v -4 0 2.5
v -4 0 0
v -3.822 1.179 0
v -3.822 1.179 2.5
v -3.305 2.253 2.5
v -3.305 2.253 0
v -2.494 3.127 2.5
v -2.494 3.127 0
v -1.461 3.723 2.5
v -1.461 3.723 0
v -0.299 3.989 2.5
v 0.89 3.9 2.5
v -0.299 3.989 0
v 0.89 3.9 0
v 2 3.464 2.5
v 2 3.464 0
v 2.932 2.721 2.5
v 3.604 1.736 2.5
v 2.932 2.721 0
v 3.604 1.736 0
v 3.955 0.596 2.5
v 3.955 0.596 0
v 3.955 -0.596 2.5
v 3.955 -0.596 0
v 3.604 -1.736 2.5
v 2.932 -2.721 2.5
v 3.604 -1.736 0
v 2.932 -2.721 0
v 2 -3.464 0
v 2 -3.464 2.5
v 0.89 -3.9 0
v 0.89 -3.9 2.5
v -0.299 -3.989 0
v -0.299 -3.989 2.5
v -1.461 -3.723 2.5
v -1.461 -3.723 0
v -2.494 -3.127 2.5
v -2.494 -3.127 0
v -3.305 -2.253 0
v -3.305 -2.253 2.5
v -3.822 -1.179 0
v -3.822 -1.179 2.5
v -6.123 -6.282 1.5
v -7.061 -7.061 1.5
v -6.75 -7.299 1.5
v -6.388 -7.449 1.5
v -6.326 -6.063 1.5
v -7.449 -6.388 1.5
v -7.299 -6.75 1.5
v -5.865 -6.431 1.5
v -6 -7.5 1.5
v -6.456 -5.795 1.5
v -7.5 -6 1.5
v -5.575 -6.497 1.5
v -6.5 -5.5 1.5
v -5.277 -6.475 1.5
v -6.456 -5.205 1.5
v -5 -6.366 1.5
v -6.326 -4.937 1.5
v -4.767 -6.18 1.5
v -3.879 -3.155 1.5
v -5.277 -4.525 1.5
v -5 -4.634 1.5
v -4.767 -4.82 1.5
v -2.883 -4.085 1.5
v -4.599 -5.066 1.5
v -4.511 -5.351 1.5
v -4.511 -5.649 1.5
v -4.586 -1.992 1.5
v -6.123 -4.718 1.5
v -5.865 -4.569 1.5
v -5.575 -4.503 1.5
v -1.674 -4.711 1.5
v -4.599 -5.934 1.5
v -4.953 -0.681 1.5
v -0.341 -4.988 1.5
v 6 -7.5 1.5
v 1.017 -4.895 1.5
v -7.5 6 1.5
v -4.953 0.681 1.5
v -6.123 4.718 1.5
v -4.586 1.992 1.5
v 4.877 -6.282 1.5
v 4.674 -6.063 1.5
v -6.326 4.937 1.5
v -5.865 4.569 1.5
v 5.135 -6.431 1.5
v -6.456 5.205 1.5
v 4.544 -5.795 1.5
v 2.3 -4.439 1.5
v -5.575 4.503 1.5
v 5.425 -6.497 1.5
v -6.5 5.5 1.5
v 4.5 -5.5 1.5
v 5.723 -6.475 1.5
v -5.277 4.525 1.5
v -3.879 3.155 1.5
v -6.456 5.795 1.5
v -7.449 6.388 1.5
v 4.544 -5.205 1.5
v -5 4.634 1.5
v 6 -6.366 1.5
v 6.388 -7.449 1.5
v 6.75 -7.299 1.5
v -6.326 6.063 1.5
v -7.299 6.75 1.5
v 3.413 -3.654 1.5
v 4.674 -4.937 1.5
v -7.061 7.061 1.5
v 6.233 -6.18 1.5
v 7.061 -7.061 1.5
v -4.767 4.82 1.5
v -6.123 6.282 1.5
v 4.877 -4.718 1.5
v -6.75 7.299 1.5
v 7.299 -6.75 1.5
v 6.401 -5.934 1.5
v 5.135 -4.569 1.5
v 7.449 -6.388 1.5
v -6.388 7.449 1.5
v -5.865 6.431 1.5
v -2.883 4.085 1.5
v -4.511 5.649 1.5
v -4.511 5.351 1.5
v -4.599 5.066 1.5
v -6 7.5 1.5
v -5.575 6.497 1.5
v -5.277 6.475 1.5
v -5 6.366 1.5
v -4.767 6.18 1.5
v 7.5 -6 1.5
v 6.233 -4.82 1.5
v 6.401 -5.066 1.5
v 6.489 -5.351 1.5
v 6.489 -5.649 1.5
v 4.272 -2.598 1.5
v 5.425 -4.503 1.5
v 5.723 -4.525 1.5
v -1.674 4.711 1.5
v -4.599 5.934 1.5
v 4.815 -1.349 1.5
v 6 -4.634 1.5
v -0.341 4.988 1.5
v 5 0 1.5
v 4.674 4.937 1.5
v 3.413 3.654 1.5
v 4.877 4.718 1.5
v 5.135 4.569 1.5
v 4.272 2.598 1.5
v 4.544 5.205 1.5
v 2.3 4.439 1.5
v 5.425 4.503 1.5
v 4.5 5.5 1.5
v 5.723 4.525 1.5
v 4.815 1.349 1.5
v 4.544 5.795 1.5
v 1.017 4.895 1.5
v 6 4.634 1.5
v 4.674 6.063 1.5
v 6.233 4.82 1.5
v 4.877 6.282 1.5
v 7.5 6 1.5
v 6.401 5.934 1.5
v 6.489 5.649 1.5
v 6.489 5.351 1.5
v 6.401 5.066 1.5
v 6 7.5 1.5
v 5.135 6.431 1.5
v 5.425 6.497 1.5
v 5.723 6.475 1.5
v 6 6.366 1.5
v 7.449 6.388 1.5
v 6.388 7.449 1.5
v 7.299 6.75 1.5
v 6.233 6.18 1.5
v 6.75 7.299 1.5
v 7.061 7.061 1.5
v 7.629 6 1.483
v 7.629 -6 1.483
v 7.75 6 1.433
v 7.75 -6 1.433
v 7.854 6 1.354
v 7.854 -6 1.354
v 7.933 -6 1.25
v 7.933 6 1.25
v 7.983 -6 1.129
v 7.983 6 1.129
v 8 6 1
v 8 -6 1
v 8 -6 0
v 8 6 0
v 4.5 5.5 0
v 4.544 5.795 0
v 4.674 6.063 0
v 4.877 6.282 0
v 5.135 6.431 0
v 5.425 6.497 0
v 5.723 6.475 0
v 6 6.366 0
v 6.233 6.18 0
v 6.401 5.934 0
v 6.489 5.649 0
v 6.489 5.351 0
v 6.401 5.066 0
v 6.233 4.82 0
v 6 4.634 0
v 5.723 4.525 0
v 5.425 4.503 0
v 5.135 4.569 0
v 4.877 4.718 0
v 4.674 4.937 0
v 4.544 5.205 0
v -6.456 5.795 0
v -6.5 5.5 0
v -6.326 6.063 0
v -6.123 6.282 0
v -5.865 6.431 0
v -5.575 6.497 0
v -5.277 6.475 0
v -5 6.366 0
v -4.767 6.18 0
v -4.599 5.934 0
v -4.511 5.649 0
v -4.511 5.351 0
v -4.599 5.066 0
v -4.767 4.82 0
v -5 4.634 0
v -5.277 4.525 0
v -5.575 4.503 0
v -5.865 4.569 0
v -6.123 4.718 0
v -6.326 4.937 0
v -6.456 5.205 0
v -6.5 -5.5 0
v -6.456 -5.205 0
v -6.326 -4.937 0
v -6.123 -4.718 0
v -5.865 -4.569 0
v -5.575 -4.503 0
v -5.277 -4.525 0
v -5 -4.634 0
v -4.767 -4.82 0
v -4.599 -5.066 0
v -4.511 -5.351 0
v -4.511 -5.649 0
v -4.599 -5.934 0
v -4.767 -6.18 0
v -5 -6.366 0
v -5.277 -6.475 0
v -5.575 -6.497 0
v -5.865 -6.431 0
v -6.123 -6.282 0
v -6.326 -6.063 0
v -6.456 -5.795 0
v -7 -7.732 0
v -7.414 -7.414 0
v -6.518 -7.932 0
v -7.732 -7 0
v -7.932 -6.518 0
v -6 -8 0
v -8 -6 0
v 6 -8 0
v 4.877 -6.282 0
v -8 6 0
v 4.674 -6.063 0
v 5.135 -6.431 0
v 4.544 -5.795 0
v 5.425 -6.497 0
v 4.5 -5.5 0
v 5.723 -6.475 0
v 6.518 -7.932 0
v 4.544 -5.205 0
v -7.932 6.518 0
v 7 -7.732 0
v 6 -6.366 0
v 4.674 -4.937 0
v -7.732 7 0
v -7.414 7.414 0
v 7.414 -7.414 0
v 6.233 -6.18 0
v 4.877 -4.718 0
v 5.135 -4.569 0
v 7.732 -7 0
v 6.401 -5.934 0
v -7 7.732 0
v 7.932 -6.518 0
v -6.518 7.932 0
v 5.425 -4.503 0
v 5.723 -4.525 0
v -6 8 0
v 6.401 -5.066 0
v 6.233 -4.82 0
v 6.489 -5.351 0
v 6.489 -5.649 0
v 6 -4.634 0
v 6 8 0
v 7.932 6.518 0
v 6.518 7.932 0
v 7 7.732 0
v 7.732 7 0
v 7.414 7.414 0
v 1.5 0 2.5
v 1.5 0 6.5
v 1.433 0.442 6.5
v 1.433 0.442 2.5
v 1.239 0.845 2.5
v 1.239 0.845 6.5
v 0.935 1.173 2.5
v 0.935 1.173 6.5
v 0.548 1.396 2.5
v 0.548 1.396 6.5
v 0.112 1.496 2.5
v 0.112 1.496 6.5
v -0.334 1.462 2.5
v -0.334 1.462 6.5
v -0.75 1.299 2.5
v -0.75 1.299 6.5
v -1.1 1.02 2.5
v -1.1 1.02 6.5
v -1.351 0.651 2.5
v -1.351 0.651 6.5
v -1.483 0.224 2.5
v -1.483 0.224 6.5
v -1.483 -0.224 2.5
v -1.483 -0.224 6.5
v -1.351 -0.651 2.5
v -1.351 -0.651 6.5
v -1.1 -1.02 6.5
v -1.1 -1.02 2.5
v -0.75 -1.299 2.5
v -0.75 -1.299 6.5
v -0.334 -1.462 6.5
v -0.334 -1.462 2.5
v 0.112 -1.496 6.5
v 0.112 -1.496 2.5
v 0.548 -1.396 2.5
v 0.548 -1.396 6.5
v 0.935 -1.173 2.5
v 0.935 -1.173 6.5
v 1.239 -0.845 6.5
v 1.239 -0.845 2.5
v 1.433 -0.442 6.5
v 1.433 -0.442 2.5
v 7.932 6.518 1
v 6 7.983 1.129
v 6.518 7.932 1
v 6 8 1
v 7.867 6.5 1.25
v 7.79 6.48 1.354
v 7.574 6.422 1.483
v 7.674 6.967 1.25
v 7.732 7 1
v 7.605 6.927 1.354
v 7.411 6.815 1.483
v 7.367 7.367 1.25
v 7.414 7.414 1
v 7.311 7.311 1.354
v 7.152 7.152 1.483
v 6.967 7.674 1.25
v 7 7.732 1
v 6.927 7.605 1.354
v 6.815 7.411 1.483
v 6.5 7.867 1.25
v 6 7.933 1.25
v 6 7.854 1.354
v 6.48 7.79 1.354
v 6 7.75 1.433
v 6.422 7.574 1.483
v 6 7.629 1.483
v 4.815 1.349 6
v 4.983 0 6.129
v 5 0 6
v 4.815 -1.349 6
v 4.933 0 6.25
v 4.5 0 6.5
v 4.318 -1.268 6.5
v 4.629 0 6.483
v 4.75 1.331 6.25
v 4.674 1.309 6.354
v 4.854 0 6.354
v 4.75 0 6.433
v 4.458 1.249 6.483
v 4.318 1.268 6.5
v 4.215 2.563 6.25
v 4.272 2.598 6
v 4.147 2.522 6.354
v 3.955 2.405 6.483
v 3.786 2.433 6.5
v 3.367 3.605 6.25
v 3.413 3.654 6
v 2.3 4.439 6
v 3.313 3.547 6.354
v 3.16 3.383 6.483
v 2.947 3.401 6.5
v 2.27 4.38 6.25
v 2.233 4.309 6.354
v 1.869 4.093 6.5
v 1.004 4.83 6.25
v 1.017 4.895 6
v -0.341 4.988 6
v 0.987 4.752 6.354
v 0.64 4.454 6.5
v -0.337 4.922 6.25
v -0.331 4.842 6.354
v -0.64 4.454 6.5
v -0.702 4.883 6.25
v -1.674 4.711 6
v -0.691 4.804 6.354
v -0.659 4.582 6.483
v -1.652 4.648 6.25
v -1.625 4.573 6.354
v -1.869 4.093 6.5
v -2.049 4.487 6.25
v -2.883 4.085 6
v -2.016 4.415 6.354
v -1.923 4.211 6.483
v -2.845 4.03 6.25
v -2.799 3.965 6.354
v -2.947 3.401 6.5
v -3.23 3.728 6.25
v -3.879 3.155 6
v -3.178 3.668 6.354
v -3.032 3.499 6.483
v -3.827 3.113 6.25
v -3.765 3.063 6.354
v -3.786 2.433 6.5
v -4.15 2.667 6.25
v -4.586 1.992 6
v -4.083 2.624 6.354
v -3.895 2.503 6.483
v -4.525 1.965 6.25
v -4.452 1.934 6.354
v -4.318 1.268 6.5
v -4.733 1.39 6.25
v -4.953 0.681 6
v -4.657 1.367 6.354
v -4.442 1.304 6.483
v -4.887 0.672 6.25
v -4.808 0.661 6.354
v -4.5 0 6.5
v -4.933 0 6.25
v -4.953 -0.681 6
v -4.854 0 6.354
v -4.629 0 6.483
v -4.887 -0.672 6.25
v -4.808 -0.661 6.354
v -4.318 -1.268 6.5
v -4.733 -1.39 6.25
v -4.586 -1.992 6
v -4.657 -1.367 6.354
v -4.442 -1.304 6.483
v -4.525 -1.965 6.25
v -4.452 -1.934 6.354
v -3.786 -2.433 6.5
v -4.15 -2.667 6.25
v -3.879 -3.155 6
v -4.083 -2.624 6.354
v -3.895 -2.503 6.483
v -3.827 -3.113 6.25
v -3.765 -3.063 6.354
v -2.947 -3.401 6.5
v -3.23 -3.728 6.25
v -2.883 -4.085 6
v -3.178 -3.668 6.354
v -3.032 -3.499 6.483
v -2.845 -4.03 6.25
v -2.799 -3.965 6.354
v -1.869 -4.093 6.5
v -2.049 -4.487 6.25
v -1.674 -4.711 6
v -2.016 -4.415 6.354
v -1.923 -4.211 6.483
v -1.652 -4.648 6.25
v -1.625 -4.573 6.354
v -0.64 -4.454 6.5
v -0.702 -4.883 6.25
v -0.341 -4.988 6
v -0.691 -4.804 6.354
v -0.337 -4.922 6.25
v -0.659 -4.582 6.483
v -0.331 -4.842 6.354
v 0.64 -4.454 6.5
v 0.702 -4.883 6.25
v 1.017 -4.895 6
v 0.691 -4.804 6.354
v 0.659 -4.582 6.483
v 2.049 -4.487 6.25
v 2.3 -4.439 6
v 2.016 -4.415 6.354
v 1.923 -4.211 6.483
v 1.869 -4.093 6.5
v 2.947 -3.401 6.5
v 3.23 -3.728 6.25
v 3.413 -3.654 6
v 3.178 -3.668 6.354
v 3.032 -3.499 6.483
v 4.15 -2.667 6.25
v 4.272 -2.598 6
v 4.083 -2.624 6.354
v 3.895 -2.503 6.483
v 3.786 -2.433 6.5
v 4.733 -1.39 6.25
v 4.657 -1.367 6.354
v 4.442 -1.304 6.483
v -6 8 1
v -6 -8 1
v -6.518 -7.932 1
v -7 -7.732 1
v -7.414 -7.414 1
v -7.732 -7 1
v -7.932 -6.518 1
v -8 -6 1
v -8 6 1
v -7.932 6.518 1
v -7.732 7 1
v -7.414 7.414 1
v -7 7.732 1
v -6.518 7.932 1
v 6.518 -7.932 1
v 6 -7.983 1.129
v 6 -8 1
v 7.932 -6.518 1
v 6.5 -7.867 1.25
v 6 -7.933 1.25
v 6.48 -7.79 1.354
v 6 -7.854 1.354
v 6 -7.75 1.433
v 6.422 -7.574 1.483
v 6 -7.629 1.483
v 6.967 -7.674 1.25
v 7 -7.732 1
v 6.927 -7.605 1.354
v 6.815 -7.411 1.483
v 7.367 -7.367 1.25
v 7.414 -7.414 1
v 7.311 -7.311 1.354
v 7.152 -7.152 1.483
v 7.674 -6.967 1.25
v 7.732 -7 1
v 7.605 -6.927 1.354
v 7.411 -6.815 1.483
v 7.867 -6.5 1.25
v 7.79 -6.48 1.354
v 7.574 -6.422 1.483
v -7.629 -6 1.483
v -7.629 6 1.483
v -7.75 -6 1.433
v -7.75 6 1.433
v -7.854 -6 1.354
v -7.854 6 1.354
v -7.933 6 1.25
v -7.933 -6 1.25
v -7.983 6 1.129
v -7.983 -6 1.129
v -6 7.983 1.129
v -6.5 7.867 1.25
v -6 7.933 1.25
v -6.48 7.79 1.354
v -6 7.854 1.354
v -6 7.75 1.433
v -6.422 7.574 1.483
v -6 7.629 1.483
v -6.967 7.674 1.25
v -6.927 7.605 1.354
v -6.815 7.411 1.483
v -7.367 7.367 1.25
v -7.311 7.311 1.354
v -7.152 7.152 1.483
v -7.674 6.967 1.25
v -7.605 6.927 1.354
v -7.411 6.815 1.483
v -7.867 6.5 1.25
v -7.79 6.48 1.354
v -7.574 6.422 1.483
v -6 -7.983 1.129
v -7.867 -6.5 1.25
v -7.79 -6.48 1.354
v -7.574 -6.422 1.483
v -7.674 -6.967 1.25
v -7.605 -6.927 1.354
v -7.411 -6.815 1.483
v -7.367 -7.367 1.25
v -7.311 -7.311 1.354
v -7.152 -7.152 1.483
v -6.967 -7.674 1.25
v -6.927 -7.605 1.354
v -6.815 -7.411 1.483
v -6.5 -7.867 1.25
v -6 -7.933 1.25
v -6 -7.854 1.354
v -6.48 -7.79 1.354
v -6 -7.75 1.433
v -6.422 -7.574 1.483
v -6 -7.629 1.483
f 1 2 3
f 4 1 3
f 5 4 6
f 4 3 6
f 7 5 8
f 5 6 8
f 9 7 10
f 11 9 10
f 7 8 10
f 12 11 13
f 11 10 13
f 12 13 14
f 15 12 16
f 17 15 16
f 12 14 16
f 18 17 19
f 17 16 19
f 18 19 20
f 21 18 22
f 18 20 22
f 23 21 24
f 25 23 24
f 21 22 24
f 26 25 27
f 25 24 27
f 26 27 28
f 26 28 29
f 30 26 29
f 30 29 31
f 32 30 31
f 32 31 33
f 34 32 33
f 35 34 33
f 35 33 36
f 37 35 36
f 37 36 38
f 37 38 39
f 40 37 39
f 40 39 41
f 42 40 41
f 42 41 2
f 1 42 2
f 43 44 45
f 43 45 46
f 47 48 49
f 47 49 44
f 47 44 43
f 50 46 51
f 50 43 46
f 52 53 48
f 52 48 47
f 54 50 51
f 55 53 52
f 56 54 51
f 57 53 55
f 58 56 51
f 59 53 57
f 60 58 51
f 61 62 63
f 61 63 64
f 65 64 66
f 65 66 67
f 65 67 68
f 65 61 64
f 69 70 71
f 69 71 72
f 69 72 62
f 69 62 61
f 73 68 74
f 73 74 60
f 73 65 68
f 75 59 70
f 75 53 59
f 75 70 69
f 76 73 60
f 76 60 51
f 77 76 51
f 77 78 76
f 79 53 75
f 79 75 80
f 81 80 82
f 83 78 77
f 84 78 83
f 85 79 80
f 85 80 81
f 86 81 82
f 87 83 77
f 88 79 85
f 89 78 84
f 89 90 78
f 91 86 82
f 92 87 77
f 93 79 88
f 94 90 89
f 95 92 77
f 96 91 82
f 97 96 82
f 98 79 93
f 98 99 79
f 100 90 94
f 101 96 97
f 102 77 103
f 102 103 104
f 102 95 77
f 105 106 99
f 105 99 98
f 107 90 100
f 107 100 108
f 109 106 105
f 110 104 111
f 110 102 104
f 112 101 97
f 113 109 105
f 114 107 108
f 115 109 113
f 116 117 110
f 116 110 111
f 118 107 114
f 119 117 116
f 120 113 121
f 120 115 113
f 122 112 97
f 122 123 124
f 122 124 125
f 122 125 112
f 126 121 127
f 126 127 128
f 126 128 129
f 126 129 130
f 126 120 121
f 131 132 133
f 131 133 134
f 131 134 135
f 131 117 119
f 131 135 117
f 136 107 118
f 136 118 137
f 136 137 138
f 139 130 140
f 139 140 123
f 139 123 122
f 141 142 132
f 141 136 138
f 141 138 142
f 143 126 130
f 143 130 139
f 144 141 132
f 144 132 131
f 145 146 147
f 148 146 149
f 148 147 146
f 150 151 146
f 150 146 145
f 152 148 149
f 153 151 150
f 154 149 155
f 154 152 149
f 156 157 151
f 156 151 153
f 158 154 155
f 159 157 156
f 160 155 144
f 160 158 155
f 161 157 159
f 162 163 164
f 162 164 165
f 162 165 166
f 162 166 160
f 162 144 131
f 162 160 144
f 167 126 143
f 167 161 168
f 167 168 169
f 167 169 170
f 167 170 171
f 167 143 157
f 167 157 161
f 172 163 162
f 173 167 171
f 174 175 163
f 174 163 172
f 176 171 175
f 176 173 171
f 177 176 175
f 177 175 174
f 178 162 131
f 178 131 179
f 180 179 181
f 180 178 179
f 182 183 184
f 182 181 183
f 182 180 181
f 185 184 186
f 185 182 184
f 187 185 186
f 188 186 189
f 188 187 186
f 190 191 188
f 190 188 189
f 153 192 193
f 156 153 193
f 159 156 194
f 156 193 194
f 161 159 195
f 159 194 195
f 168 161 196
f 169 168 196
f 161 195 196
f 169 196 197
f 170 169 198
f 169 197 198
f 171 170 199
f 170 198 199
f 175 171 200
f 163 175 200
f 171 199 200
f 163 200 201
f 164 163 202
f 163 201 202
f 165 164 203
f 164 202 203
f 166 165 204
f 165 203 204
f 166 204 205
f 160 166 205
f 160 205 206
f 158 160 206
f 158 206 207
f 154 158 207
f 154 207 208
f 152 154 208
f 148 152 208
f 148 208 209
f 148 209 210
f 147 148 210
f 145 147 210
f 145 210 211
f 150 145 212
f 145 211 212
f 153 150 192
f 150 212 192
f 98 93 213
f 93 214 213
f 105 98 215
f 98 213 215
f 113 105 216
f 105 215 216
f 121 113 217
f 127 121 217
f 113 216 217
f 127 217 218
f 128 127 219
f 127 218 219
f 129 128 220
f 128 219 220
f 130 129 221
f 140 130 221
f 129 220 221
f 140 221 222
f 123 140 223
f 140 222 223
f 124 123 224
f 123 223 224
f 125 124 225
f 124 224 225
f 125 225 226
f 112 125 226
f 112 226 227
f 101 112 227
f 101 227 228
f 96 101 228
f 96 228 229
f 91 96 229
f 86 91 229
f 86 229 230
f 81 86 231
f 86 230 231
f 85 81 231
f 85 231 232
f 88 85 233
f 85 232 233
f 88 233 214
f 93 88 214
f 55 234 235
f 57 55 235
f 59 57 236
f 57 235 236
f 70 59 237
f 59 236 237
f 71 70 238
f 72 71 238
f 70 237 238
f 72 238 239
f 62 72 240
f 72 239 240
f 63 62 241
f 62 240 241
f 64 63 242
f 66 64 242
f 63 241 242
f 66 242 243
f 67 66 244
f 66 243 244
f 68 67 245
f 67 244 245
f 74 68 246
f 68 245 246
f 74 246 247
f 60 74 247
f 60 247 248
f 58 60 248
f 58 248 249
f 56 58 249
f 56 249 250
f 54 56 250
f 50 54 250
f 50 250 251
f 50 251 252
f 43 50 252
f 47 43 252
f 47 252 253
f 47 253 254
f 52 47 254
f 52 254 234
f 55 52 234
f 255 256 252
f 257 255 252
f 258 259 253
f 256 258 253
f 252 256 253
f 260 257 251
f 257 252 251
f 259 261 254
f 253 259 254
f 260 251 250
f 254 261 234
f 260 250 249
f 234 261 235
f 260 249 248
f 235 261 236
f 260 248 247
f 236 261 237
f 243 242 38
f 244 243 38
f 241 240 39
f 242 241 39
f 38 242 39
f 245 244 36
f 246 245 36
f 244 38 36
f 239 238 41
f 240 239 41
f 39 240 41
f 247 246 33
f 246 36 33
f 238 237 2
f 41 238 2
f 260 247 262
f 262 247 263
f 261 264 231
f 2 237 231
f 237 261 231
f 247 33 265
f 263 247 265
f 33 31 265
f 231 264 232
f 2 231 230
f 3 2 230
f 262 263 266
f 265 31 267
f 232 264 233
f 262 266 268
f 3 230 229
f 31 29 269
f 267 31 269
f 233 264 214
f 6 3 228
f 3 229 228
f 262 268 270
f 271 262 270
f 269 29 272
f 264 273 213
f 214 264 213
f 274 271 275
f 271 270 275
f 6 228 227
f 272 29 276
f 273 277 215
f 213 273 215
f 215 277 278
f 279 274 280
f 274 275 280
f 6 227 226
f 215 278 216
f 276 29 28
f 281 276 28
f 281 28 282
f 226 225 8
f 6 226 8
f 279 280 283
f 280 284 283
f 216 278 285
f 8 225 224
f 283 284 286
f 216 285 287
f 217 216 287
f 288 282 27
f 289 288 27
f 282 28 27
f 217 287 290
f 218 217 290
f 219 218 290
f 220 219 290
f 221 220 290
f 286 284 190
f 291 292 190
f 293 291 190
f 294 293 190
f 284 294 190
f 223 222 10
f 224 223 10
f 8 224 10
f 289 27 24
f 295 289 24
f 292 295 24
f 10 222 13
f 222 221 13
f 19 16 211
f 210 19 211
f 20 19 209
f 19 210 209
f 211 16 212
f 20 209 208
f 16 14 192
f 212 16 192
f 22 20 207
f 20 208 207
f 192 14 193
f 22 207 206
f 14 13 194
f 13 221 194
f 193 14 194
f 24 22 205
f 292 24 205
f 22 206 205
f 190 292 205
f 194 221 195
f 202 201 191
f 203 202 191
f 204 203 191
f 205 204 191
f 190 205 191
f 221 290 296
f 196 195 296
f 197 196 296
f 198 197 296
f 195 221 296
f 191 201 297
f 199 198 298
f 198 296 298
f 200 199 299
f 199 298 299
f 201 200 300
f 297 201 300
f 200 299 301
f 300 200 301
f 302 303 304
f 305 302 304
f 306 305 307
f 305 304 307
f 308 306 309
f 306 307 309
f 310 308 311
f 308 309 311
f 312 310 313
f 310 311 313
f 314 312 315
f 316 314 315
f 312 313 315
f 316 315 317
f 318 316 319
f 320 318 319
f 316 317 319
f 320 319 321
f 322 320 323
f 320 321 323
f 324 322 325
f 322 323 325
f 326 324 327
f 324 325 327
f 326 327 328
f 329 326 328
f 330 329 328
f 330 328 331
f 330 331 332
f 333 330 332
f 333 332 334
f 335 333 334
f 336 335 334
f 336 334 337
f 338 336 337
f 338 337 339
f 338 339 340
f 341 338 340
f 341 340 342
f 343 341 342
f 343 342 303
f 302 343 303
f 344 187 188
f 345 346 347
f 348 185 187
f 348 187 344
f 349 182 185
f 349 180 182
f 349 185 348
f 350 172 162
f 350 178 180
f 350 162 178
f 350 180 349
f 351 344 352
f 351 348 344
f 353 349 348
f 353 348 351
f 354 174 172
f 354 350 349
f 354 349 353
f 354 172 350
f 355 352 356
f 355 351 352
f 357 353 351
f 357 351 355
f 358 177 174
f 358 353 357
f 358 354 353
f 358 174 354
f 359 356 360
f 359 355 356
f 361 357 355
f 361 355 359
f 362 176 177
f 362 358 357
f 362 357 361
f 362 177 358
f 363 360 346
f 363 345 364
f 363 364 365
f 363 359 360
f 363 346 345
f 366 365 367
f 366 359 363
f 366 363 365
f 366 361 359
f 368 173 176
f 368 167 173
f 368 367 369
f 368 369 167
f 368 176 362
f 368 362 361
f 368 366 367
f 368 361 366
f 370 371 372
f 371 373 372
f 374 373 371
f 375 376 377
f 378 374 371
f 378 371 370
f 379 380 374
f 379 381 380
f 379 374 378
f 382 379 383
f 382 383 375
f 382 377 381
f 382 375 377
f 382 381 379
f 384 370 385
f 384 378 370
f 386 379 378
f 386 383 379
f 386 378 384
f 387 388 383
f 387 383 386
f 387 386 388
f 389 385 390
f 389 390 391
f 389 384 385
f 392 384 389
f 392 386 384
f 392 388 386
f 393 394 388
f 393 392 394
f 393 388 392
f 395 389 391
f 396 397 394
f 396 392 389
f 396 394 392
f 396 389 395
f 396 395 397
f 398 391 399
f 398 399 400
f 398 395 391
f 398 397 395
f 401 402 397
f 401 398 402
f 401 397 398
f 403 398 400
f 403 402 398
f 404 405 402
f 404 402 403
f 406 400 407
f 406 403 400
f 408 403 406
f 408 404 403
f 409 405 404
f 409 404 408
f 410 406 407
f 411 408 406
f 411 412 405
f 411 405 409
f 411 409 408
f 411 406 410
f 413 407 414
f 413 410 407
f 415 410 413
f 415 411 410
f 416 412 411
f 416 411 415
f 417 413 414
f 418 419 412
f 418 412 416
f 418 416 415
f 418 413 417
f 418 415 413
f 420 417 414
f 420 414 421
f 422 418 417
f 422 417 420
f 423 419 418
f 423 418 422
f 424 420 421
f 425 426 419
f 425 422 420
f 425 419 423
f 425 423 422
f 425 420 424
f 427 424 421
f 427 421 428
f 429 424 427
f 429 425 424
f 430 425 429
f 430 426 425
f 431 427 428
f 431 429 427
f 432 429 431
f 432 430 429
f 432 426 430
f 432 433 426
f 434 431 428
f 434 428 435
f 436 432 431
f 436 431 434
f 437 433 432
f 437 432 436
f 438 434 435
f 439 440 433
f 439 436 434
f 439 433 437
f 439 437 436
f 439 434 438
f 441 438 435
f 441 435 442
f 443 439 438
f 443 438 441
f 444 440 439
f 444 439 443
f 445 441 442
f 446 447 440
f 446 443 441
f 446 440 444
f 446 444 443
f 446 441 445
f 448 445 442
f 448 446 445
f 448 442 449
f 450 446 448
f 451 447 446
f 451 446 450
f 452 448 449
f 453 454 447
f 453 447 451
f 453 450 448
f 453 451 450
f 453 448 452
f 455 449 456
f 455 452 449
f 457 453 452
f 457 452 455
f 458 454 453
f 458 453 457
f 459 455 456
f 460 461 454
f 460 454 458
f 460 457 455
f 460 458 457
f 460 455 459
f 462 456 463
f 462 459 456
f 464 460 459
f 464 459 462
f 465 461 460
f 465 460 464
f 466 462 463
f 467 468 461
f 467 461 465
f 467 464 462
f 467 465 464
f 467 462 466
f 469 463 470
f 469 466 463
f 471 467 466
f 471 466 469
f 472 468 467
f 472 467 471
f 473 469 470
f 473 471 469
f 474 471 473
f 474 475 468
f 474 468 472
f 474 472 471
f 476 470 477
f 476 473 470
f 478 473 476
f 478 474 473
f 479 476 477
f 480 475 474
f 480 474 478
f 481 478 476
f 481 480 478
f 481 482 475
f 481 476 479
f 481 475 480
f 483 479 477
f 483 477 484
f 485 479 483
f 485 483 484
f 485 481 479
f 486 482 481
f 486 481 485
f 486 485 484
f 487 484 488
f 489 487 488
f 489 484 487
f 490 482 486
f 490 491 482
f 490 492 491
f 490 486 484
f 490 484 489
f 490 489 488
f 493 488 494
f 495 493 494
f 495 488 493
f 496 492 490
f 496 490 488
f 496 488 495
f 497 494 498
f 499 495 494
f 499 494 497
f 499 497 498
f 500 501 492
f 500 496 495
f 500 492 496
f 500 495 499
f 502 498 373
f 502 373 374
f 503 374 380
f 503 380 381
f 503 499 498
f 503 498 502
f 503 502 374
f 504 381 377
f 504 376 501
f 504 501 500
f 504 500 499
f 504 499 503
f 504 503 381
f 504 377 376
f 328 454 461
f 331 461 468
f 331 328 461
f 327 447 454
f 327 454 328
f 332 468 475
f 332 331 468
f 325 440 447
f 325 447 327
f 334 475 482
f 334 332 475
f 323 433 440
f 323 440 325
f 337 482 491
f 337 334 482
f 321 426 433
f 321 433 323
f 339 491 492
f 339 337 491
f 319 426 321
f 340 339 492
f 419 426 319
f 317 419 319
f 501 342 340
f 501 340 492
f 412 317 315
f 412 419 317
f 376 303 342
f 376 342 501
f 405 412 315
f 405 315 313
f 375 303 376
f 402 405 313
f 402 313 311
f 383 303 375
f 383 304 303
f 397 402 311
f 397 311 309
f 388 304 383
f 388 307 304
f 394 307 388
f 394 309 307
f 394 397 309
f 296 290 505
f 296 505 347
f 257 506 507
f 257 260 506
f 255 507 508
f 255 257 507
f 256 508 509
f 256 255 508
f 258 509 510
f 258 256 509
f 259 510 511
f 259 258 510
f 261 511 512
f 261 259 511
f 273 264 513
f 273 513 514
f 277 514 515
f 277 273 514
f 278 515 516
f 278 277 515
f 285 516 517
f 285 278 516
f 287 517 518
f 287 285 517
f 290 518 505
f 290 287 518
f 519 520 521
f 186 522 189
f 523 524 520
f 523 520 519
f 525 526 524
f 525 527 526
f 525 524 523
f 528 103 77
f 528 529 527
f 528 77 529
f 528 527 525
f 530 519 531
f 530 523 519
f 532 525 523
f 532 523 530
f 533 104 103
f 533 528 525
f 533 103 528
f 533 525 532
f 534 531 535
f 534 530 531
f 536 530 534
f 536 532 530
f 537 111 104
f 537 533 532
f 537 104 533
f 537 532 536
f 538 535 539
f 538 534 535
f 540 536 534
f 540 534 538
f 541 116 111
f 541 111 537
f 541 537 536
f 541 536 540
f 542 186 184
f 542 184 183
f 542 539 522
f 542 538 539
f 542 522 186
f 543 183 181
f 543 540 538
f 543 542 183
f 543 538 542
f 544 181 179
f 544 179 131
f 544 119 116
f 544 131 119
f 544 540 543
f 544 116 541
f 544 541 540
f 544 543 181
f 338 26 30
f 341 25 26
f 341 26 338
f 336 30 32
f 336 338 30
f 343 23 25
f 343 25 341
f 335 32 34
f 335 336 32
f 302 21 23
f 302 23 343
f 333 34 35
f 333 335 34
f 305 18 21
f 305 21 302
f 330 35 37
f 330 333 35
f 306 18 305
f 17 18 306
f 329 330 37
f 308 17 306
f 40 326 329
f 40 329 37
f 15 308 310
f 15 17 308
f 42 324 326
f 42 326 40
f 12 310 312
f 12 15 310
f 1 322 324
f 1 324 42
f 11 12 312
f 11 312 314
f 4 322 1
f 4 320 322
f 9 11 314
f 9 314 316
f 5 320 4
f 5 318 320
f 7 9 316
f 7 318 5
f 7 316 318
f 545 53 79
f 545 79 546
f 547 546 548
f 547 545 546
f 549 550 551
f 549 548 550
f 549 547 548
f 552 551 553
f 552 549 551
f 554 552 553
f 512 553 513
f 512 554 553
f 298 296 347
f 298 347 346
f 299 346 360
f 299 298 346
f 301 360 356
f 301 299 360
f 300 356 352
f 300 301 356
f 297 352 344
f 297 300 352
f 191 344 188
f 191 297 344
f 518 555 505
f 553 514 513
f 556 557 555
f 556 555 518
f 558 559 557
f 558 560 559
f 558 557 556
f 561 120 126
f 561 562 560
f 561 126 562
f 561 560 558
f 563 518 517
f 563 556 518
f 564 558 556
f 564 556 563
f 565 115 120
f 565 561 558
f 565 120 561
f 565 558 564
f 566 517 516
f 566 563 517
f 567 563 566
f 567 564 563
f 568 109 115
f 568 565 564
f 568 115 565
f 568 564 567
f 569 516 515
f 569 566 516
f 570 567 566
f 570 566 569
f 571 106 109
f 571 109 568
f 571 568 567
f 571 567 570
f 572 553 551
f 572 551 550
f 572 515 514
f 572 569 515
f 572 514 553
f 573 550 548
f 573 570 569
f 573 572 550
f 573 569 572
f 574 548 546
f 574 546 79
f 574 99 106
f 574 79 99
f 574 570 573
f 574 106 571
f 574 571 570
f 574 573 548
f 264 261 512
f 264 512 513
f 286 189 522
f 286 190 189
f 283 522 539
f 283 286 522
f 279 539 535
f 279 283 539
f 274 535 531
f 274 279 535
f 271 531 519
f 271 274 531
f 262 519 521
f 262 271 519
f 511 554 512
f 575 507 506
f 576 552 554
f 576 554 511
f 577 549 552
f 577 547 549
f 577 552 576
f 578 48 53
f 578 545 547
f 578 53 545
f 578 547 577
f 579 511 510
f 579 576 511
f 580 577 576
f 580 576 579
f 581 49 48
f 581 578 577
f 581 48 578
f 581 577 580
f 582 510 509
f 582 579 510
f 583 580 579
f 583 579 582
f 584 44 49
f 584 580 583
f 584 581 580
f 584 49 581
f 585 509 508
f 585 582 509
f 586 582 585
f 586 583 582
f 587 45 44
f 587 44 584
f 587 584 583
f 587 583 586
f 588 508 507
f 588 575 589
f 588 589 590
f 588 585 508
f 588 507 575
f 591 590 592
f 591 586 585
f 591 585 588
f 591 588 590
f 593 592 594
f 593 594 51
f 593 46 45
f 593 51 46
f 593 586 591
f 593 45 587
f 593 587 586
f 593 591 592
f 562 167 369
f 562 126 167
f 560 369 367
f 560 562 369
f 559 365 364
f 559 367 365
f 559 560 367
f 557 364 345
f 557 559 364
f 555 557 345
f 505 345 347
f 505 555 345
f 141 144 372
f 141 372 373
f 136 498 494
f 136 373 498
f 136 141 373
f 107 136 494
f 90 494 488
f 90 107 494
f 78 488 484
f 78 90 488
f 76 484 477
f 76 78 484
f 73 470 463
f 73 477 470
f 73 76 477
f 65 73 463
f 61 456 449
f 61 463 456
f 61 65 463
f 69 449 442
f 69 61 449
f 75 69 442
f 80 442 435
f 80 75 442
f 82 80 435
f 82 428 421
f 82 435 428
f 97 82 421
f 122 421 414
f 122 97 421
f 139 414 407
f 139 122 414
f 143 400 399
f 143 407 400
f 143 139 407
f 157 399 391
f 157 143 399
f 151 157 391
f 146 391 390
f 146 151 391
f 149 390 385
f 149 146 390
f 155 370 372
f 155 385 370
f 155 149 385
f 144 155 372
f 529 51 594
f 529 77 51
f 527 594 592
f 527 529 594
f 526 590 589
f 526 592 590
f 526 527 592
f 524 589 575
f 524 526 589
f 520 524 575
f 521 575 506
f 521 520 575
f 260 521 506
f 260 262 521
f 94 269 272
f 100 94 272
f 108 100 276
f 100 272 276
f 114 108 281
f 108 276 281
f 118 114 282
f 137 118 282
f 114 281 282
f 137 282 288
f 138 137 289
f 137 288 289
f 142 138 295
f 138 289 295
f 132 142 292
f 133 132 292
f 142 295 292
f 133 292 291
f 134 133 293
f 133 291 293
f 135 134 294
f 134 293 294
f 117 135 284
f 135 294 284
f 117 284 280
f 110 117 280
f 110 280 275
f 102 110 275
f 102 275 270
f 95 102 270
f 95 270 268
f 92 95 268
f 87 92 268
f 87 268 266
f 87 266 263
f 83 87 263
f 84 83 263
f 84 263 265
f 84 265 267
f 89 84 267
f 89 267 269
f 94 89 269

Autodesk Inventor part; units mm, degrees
ref_plane "YZ Plane" through (0, 0, 0) normal (1, 0, 0) x (0, 1, 0)
ref_plane "XZ Plane" through (0, 0, 0) normal (0, 1, 0) x (-1, 0, 0)
ref_plane "XY Plane" through (0, 0, 0) normal (0, 0, 1) x (1, 0, 0)
sketch "Sketch1" plane through (0, 0, 0) normal (0, 0, 1) x (1, 0, 0)
  line L0 (-6, 8) -> (6, 8)
  line L1 (8, 6) -> (8, -6)
  line L2 (6, -8) -> (-6, -8)
  line L3 (-8, -6) -> (-8, 6)
  line L4 (-8, 8) -> (8, -8) construction
  line L5 (8, 8) -> (-8, -8) construction
  arc A0 (-6, 8) -> (-8, 6) centre (-6, 6) ccw
  arc A1 (-8, -6) -> (-6, -8) centre (-6, -6) ccw
  arc A2 (8, 6) -> (6, 8) centre (6, 6) ccw
  arc A3 (6, -8) -> (8, -6) centre (6, -6) ccw
  point P0 (0, 0)
  dimension "d0" = 16
  dimension "d1" = 16
  dimension "d2" = 2
extrude "Extrusion1" add sketch "Sketch1" along normal blind 1.5
sketch "Sketch2" plane through (0, 0, 1.5) normal (0, 0, 1) x (1, 0, 0)
  circle A0 centre (0, 0) radius 5
  dimension "d5" = 10
extrude "Extrusion2" add sketch "Sketch2" along normal blind 5
fillet "Fillet1" radius 0.5 9 edges at (-5, 0, 6.5) (-7.4142, 7.4142, 1.5) (-8, 0, 1.5) (-7.4142, -7.4142, 1.5) (0, -8, 1.5) (7.4142, -7.4142, 1.5) (8, 0, 1.5) (7.4142, 7.4142, 1.5) (0, 8, 1.5)
sketch "Sketch3" plane through (0, 0, 6.5) normal (0, 0, 1) x (1, 0, 0)
  circle A0 centre (0, 0) radius 4.5 projected
  circle A1 centre (0, 0) radius 1.5
  dimension "d9" = 3
extrude "Extrusion3" cut sketch "Sketch3" against normal through all contours A1
sketch "Sketch4" plane through (0, 0, 0) normal (0, 0, -1) x (-1, 0, 0)
  circle A0 centre (0, 0) radius 1.5 projected
  circle A1 centre (0, 0) radius 4
  dimension "d12" = 8
extrude "Extrusion4" cut sketch "Sketch4" against normal blind 2.5
sketch "Sketch5" plane through (0, 0, 0) normal (0, 0, -1) x (-1, 0, 0)
  line L0 (6, -8) -> (-6, -8) projected
  line L1 (8, 6) -> (8, -6) projected
  line L2 (-8, -6) -> (-8, 6) projected
  circle A0 centre (-5.5, 5.5) radius 1
  circle A1 centre (5.5, 5.5) radius 1
  circle A2 centre (5.5, -5.5) radius 1
  circle A3 centre (-5.5, -5.5) radius 1
  dimension "d15" = 2.5
  dimension "d16" = 2.5
  dimension "d17" = 11
  dimension "d18" = 2
  dimension "d19" = 2.5
extrude "Extrusion5" cut sketch "Sketch5" against normal through all
properties part number "12B VALVE BONNET" material "Steel AISI 1020 107 HR"
